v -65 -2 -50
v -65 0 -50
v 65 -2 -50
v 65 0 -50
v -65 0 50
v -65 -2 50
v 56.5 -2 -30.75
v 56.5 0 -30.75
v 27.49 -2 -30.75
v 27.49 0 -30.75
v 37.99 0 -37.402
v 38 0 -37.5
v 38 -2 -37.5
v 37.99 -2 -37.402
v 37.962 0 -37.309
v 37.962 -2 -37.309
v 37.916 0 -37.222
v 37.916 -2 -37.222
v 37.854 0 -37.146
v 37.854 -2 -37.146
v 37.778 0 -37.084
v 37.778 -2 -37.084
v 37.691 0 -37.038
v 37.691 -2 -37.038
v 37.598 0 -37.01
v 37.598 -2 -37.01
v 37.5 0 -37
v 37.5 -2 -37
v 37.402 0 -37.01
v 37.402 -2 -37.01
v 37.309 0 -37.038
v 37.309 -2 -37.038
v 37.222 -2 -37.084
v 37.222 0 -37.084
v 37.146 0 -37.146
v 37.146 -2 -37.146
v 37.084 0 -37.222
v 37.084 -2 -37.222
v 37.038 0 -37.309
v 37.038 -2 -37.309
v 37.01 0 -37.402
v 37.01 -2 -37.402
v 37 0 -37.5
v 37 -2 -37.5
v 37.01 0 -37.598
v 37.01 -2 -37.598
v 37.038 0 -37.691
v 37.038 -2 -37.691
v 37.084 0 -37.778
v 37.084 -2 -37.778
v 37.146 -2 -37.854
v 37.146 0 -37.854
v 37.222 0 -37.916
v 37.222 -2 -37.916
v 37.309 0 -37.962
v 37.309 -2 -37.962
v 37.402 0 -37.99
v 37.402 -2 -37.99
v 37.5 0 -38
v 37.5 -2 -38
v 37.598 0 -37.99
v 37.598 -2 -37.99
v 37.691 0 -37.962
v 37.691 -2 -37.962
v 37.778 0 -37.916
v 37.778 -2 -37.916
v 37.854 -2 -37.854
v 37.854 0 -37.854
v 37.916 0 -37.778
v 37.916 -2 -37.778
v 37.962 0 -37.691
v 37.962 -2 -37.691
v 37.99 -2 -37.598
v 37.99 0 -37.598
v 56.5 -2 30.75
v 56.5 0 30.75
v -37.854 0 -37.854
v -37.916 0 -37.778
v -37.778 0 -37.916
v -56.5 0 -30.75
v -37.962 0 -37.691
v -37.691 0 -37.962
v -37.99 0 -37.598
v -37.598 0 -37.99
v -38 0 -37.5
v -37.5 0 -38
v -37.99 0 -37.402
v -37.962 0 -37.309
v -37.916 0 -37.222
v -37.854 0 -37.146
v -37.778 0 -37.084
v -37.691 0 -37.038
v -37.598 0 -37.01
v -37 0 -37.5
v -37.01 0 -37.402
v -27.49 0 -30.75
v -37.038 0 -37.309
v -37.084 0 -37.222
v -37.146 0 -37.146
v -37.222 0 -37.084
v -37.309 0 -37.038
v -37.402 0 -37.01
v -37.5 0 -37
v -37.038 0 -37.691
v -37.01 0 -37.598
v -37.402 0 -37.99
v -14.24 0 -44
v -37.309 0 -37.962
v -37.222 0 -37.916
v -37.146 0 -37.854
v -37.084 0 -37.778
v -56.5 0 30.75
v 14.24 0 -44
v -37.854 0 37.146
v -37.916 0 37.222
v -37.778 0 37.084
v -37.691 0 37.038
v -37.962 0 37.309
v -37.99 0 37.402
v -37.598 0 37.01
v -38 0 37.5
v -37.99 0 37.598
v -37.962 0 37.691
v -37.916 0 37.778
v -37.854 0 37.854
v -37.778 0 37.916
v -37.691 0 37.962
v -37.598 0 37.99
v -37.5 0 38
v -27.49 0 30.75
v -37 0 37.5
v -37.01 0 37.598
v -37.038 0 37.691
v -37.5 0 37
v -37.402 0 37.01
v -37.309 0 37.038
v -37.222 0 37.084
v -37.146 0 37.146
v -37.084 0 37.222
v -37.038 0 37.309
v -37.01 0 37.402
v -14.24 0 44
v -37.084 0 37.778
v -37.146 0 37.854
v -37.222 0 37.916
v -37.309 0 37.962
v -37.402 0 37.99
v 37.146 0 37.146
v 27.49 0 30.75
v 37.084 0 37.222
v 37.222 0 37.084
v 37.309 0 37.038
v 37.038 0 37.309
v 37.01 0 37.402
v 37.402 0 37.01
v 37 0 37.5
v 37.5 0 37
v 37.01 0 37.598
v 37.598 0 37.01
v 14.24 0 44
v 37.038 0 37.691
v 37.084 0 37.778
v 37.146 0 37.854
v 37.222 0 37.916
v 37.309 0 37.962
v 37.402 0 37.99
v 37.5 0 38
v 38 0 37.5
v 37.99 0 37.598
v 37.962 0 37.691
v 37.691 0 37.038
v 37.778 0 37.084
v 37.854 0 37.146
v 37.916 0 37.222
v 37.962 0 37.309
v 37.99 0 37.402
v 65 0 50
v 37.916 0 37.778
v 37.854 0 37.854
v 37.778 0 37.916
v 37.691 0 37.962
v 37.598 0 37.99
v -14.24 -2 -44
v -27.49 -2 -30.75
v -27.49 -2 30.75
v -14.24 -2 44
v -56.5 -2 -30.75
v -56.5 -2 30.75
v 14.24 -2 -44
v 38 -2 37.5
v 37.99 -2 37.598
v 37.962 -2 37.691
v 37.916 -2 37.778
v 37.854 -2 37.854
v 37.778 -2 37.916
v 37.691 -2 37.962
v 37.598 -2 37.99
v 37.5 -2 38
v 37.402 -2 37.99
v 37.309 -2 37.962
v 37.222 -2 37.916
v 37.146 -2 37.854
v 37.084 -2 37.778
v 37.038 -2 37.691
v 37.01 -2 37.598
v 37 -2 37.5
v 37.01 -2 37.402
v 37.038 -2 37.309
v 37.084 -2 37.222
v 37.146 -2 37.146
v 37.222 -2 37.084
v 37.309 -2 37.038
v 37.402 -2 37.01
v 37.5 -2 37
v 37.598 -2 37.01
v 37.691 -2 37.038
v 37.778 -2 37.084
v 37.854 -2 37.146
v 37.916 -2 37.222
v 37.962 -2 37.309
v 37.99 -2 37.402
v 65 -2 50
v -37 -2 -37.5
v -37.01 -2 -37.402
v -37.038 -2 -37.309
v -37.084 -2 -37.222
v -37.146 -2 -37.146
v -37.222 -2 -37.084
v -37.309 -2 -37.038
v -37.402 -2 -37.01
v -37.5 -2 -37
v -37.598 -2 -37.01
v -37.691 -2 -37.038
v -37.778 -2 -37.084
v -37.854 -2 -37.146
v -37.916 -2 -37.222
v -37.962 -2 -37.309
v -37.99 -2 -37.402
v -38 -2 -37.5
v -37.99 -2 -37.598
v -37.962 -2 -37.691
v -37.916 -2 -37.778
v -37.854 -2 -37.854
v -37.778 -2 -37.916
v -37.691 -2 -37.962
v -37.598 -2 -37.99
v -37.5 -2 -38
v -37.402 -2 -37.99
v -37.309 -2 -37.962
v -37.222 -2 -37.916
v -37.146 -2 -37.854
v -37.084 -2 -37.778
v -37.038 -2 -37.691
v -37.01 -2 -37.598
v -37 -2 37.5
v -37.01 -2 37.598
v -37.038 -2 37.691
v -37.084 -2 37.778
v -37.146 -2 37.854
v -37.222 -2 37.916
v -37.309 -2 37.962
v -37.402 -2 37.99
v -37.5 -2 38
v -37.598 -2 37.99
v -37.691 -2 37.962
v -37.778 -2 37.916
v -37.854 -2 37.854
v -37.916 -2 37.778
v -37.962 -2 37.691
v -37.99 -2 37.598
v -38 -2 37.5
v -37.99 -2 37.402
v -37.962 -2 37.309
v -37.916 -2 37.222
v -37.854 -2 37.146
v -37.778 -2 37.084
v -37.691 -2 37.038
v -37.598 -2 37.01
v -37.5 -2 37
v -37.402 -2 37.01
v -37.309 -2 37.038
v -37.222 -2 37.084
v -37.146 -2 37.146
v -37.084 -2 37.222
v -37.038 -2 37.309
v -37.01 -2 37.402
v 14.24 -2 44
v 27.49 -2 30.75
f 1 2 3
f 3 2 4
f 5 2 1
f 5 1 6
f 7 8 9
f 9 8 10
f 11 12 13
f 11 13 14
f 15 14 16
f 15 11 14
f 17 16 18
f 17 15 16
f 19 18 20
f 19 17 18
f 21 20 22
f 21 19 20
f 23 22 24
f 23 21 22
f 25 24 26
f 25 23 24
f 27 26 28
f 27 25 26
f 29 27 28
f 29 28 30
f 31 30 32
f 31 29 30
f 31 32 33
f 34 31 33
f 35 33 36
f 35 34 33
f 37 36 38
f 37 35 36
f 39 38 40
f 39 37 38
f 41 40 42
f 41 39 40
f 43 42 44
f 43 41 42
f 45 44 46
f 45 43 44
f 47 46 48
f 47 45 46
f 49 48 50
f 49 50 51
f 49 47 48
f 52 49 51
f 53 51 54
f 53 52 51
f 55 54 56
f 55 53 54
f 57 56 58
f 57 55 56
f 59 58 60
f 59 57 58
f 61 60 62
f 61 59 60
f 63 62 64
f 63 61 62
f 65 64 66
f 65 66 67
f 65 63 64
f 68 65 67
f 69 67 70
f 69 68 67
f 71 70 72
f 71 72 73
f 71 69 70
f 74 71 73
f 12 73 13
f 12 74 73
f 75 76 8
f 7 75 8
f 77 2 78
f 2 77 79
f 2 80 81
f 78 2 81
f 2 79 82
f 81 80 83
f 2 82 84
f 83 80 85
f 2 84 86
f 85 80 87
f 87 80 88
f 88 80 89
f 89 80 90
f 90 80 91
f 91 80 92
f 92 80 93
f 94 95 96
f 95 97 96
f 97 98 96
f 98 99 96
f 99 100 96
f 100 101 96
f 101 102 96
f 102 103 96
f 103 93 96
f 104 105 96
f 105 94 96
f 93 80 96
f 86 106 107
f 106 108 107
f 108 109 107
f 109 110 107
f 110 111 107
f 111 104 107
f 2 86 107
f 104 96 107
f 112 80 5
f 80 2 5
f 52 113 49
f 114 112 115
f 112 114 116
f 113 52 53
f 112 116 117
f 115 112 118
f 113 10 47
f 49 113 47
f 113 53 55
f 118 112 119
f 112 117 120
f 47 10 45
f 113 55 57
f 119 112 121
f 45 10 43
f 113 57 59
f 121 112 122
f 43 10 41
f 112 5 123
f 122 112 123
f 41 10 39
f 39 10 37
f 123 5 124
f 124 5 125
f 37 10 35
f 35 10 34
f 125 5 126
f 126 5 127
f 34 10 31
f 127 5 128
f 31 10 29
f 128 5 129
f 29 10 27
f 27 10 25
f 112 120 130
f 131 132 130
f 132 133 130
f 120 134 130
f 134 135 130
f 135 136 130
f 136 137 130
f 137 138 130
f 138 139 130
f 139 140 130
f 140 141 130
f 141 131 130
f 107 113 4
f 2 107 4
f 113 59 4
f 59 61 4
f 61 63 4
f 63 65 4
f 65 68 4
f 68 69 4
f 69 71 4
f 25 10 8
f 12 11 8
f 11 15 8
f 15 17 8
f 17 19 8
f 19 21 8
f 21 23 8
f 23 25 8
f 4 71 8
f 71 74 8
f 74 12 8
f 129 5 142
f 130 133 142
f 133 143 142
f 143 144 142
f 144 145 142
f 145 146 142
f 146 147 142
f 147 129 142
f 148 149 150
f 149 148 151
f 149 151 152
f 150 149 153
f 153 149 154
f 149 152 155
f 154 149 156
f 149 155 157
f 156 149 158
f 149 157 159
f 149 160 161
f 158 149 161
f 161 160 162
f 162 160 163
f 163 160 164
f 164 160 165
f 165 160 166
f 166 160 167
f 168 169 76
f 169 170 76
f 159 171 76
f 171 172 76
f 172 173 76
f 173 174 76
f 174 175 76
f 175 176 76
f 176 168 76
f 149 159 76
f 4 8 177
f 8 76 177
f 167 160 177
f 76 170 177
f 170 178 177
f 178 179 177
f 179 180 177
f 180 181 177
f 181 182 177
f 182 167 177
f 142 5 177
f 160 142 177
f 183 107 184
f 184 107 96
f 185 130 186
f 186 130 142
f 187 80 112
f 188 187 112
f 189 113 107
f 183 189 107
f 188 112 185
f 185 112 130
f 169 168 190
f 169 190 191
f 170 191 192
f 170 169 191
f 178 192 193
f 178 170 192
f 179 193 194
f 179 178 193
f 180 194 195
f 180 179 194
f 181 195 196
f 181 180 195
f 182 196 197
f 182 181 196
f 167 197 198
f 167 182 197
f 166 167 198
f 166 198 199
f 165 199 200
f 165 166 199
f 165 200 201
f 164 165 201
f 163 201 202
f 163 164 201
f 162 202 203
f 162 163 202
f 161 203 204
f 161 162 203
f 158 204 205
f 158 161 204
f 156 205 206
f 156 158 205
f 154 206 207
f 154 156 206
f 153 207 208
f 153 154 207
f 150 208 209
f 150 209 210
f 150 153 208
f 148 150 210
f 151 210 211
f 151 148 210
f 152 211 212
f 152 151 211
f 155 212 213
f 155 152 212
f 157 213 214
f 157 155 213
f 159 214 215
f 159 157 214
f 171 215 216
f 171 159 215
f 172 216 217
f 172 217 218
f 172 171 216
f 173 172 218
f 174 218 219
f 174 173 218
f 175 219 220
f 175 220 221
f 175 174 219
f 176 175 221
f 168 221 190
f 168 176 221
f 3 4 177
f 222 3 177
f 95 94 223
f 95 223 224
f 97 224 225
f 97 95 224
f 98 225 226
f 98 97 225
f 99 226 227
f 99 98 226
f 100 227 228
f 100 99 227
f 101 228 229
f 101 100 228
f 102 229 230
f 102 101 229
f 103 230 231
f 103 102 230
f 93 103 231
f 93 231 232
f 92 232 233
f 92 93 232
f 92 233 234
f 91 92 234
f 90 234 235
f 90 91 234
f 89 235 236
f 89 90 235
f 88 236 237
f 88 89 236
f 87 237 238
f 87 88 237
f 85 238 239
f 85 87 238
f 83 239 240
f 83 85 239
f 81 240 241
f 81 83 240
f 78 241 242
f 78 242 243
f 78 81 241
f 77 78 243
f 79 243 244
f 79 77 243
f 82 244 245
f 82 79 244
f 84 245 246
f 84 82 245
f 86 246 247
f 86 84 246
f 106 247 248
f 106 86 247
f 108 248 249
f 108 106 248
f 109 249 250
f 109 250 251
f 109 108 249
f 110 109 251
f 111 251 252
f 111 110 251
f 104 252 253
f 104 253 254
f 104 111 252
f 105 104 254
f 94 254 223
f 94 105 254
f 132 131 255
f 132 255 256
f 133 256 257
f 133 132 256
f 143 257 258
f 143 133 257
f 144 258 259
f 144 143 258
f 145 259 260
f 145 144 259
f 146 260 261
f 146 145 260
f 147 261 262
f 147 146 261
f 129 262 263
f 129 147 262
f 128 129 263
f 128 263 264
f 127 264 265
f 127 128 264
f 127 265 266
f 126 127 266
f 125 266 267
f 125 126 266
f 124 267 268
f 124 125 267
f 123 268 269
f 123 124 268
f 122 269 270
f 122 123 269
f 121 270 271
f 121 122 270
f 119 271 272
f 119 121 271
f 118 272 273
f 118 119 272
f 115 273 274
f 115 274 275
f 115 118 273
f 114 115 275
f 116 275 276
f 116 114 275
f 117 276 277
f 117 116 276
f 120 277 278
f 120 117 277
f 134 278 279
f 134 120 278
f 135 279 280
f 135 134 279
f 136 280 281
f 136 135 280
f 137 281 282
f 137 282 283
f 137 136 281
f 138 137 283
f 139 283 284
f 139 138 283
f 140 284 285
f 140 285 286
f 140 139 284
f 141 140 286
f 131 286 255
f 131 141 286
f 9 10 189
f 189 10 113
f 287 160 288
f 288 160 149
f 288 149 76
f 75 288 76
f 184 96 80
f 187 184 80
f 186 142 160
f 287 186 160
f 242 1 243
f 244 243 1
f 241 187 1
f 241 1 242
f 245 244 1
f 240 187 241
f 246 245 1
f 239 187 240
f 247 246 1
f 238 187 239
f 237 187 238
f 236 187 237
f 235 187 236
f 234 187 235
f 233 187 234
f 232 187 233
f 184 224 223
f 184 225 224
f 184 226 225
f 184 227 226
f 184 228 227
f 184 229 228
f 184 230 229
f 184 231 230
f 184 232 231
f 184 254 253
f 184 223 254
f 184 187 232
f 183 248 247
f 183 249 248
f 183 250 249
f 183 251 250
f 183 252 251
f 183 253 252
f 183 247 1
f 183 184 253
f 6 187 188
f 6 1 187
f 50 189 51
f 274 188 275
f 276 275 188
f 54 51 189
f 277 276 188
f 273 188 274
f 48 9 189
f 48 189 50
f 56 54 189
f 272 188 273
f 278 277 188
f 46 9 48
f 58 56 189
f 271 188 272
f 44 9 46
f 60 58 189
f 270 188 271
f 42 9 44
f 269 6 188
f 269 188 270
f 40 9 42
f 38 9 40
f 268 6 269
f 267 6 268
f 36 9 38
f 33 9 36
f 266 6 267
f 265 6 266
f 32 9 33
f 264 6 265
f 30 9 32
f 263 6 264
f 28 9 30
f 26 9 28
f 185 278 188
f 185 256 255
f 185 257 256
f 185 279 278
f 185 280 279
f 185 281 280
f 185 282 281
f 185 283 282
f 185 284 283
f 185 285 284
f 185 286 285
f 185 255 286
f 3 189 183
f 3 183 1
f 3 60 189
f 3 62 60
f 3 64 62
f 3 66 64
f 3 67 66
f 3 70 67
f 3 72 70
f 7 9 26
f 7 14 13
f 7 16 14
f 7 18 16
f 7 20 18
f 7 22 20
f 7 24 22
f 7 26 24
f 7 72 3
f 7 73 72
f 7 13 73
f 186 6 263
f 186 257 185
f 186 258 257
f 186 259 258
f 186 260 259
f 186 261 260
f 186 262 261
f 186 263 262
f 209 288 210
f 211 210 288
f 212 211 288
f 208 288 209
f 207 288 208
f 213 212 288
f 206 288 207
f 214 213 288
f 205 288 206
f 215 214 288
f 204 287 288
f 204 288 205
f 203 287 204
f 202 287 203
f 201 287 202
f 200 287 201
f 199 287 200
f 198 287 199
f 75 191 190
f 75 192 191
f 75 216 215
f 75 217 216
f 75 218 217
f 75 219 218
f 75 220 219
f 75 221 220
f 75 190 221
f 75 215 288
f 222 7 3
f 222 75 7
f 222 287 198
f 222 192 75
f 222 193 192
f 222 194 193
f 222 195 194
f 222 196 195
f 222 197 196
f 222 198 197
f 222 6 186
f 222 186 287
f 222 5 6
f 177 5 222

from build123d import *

# Parameters (mm, degrees)
F0_W     = 130
F0_H     = 100
F0_R     = 0.5
F1_DEPTH = 2


with BuildPart() as f1:
    # F0 (on Front) → F1 (new body)
    with BuildSketch(Plane.XZ):
        Rectangle(F0_W, F0_H)
        with Locations((-37.5, -37.5)):
            Circle(F0_R, mode=Mode.SUBTRACT)
        with Locations((37.5, -37.5)):
            Circle(F0_R, mode=Mode.SUBTRACT)
        with Locations((-37.5, 37.5)):
            Circle(F0_R, mode=Mode.SUBTRACT)
        Polygon((-27.489878, 30.75), (-14.239878, 44), (0, 44), (14.239878, 44), (27.489878, 30.75), (56.5, 30.75), (56.5, 0), (56.5, -30.75), (27.489878, -30.75), (14.239878, -44), (0, -44), (-14.239878, -44), (-27.489878, -30.75), (-56.5, -30.75), (-56.5, 0), (-56.5, 30.75), align=None, mode=Mode.SUBTRACT)
        with Locations((37.5, 37.5)):
            Circle(F0_R, mode=Mode.SUBTRACT)
    extrude(amount=F1_DEPTH)


solid = f1.part
